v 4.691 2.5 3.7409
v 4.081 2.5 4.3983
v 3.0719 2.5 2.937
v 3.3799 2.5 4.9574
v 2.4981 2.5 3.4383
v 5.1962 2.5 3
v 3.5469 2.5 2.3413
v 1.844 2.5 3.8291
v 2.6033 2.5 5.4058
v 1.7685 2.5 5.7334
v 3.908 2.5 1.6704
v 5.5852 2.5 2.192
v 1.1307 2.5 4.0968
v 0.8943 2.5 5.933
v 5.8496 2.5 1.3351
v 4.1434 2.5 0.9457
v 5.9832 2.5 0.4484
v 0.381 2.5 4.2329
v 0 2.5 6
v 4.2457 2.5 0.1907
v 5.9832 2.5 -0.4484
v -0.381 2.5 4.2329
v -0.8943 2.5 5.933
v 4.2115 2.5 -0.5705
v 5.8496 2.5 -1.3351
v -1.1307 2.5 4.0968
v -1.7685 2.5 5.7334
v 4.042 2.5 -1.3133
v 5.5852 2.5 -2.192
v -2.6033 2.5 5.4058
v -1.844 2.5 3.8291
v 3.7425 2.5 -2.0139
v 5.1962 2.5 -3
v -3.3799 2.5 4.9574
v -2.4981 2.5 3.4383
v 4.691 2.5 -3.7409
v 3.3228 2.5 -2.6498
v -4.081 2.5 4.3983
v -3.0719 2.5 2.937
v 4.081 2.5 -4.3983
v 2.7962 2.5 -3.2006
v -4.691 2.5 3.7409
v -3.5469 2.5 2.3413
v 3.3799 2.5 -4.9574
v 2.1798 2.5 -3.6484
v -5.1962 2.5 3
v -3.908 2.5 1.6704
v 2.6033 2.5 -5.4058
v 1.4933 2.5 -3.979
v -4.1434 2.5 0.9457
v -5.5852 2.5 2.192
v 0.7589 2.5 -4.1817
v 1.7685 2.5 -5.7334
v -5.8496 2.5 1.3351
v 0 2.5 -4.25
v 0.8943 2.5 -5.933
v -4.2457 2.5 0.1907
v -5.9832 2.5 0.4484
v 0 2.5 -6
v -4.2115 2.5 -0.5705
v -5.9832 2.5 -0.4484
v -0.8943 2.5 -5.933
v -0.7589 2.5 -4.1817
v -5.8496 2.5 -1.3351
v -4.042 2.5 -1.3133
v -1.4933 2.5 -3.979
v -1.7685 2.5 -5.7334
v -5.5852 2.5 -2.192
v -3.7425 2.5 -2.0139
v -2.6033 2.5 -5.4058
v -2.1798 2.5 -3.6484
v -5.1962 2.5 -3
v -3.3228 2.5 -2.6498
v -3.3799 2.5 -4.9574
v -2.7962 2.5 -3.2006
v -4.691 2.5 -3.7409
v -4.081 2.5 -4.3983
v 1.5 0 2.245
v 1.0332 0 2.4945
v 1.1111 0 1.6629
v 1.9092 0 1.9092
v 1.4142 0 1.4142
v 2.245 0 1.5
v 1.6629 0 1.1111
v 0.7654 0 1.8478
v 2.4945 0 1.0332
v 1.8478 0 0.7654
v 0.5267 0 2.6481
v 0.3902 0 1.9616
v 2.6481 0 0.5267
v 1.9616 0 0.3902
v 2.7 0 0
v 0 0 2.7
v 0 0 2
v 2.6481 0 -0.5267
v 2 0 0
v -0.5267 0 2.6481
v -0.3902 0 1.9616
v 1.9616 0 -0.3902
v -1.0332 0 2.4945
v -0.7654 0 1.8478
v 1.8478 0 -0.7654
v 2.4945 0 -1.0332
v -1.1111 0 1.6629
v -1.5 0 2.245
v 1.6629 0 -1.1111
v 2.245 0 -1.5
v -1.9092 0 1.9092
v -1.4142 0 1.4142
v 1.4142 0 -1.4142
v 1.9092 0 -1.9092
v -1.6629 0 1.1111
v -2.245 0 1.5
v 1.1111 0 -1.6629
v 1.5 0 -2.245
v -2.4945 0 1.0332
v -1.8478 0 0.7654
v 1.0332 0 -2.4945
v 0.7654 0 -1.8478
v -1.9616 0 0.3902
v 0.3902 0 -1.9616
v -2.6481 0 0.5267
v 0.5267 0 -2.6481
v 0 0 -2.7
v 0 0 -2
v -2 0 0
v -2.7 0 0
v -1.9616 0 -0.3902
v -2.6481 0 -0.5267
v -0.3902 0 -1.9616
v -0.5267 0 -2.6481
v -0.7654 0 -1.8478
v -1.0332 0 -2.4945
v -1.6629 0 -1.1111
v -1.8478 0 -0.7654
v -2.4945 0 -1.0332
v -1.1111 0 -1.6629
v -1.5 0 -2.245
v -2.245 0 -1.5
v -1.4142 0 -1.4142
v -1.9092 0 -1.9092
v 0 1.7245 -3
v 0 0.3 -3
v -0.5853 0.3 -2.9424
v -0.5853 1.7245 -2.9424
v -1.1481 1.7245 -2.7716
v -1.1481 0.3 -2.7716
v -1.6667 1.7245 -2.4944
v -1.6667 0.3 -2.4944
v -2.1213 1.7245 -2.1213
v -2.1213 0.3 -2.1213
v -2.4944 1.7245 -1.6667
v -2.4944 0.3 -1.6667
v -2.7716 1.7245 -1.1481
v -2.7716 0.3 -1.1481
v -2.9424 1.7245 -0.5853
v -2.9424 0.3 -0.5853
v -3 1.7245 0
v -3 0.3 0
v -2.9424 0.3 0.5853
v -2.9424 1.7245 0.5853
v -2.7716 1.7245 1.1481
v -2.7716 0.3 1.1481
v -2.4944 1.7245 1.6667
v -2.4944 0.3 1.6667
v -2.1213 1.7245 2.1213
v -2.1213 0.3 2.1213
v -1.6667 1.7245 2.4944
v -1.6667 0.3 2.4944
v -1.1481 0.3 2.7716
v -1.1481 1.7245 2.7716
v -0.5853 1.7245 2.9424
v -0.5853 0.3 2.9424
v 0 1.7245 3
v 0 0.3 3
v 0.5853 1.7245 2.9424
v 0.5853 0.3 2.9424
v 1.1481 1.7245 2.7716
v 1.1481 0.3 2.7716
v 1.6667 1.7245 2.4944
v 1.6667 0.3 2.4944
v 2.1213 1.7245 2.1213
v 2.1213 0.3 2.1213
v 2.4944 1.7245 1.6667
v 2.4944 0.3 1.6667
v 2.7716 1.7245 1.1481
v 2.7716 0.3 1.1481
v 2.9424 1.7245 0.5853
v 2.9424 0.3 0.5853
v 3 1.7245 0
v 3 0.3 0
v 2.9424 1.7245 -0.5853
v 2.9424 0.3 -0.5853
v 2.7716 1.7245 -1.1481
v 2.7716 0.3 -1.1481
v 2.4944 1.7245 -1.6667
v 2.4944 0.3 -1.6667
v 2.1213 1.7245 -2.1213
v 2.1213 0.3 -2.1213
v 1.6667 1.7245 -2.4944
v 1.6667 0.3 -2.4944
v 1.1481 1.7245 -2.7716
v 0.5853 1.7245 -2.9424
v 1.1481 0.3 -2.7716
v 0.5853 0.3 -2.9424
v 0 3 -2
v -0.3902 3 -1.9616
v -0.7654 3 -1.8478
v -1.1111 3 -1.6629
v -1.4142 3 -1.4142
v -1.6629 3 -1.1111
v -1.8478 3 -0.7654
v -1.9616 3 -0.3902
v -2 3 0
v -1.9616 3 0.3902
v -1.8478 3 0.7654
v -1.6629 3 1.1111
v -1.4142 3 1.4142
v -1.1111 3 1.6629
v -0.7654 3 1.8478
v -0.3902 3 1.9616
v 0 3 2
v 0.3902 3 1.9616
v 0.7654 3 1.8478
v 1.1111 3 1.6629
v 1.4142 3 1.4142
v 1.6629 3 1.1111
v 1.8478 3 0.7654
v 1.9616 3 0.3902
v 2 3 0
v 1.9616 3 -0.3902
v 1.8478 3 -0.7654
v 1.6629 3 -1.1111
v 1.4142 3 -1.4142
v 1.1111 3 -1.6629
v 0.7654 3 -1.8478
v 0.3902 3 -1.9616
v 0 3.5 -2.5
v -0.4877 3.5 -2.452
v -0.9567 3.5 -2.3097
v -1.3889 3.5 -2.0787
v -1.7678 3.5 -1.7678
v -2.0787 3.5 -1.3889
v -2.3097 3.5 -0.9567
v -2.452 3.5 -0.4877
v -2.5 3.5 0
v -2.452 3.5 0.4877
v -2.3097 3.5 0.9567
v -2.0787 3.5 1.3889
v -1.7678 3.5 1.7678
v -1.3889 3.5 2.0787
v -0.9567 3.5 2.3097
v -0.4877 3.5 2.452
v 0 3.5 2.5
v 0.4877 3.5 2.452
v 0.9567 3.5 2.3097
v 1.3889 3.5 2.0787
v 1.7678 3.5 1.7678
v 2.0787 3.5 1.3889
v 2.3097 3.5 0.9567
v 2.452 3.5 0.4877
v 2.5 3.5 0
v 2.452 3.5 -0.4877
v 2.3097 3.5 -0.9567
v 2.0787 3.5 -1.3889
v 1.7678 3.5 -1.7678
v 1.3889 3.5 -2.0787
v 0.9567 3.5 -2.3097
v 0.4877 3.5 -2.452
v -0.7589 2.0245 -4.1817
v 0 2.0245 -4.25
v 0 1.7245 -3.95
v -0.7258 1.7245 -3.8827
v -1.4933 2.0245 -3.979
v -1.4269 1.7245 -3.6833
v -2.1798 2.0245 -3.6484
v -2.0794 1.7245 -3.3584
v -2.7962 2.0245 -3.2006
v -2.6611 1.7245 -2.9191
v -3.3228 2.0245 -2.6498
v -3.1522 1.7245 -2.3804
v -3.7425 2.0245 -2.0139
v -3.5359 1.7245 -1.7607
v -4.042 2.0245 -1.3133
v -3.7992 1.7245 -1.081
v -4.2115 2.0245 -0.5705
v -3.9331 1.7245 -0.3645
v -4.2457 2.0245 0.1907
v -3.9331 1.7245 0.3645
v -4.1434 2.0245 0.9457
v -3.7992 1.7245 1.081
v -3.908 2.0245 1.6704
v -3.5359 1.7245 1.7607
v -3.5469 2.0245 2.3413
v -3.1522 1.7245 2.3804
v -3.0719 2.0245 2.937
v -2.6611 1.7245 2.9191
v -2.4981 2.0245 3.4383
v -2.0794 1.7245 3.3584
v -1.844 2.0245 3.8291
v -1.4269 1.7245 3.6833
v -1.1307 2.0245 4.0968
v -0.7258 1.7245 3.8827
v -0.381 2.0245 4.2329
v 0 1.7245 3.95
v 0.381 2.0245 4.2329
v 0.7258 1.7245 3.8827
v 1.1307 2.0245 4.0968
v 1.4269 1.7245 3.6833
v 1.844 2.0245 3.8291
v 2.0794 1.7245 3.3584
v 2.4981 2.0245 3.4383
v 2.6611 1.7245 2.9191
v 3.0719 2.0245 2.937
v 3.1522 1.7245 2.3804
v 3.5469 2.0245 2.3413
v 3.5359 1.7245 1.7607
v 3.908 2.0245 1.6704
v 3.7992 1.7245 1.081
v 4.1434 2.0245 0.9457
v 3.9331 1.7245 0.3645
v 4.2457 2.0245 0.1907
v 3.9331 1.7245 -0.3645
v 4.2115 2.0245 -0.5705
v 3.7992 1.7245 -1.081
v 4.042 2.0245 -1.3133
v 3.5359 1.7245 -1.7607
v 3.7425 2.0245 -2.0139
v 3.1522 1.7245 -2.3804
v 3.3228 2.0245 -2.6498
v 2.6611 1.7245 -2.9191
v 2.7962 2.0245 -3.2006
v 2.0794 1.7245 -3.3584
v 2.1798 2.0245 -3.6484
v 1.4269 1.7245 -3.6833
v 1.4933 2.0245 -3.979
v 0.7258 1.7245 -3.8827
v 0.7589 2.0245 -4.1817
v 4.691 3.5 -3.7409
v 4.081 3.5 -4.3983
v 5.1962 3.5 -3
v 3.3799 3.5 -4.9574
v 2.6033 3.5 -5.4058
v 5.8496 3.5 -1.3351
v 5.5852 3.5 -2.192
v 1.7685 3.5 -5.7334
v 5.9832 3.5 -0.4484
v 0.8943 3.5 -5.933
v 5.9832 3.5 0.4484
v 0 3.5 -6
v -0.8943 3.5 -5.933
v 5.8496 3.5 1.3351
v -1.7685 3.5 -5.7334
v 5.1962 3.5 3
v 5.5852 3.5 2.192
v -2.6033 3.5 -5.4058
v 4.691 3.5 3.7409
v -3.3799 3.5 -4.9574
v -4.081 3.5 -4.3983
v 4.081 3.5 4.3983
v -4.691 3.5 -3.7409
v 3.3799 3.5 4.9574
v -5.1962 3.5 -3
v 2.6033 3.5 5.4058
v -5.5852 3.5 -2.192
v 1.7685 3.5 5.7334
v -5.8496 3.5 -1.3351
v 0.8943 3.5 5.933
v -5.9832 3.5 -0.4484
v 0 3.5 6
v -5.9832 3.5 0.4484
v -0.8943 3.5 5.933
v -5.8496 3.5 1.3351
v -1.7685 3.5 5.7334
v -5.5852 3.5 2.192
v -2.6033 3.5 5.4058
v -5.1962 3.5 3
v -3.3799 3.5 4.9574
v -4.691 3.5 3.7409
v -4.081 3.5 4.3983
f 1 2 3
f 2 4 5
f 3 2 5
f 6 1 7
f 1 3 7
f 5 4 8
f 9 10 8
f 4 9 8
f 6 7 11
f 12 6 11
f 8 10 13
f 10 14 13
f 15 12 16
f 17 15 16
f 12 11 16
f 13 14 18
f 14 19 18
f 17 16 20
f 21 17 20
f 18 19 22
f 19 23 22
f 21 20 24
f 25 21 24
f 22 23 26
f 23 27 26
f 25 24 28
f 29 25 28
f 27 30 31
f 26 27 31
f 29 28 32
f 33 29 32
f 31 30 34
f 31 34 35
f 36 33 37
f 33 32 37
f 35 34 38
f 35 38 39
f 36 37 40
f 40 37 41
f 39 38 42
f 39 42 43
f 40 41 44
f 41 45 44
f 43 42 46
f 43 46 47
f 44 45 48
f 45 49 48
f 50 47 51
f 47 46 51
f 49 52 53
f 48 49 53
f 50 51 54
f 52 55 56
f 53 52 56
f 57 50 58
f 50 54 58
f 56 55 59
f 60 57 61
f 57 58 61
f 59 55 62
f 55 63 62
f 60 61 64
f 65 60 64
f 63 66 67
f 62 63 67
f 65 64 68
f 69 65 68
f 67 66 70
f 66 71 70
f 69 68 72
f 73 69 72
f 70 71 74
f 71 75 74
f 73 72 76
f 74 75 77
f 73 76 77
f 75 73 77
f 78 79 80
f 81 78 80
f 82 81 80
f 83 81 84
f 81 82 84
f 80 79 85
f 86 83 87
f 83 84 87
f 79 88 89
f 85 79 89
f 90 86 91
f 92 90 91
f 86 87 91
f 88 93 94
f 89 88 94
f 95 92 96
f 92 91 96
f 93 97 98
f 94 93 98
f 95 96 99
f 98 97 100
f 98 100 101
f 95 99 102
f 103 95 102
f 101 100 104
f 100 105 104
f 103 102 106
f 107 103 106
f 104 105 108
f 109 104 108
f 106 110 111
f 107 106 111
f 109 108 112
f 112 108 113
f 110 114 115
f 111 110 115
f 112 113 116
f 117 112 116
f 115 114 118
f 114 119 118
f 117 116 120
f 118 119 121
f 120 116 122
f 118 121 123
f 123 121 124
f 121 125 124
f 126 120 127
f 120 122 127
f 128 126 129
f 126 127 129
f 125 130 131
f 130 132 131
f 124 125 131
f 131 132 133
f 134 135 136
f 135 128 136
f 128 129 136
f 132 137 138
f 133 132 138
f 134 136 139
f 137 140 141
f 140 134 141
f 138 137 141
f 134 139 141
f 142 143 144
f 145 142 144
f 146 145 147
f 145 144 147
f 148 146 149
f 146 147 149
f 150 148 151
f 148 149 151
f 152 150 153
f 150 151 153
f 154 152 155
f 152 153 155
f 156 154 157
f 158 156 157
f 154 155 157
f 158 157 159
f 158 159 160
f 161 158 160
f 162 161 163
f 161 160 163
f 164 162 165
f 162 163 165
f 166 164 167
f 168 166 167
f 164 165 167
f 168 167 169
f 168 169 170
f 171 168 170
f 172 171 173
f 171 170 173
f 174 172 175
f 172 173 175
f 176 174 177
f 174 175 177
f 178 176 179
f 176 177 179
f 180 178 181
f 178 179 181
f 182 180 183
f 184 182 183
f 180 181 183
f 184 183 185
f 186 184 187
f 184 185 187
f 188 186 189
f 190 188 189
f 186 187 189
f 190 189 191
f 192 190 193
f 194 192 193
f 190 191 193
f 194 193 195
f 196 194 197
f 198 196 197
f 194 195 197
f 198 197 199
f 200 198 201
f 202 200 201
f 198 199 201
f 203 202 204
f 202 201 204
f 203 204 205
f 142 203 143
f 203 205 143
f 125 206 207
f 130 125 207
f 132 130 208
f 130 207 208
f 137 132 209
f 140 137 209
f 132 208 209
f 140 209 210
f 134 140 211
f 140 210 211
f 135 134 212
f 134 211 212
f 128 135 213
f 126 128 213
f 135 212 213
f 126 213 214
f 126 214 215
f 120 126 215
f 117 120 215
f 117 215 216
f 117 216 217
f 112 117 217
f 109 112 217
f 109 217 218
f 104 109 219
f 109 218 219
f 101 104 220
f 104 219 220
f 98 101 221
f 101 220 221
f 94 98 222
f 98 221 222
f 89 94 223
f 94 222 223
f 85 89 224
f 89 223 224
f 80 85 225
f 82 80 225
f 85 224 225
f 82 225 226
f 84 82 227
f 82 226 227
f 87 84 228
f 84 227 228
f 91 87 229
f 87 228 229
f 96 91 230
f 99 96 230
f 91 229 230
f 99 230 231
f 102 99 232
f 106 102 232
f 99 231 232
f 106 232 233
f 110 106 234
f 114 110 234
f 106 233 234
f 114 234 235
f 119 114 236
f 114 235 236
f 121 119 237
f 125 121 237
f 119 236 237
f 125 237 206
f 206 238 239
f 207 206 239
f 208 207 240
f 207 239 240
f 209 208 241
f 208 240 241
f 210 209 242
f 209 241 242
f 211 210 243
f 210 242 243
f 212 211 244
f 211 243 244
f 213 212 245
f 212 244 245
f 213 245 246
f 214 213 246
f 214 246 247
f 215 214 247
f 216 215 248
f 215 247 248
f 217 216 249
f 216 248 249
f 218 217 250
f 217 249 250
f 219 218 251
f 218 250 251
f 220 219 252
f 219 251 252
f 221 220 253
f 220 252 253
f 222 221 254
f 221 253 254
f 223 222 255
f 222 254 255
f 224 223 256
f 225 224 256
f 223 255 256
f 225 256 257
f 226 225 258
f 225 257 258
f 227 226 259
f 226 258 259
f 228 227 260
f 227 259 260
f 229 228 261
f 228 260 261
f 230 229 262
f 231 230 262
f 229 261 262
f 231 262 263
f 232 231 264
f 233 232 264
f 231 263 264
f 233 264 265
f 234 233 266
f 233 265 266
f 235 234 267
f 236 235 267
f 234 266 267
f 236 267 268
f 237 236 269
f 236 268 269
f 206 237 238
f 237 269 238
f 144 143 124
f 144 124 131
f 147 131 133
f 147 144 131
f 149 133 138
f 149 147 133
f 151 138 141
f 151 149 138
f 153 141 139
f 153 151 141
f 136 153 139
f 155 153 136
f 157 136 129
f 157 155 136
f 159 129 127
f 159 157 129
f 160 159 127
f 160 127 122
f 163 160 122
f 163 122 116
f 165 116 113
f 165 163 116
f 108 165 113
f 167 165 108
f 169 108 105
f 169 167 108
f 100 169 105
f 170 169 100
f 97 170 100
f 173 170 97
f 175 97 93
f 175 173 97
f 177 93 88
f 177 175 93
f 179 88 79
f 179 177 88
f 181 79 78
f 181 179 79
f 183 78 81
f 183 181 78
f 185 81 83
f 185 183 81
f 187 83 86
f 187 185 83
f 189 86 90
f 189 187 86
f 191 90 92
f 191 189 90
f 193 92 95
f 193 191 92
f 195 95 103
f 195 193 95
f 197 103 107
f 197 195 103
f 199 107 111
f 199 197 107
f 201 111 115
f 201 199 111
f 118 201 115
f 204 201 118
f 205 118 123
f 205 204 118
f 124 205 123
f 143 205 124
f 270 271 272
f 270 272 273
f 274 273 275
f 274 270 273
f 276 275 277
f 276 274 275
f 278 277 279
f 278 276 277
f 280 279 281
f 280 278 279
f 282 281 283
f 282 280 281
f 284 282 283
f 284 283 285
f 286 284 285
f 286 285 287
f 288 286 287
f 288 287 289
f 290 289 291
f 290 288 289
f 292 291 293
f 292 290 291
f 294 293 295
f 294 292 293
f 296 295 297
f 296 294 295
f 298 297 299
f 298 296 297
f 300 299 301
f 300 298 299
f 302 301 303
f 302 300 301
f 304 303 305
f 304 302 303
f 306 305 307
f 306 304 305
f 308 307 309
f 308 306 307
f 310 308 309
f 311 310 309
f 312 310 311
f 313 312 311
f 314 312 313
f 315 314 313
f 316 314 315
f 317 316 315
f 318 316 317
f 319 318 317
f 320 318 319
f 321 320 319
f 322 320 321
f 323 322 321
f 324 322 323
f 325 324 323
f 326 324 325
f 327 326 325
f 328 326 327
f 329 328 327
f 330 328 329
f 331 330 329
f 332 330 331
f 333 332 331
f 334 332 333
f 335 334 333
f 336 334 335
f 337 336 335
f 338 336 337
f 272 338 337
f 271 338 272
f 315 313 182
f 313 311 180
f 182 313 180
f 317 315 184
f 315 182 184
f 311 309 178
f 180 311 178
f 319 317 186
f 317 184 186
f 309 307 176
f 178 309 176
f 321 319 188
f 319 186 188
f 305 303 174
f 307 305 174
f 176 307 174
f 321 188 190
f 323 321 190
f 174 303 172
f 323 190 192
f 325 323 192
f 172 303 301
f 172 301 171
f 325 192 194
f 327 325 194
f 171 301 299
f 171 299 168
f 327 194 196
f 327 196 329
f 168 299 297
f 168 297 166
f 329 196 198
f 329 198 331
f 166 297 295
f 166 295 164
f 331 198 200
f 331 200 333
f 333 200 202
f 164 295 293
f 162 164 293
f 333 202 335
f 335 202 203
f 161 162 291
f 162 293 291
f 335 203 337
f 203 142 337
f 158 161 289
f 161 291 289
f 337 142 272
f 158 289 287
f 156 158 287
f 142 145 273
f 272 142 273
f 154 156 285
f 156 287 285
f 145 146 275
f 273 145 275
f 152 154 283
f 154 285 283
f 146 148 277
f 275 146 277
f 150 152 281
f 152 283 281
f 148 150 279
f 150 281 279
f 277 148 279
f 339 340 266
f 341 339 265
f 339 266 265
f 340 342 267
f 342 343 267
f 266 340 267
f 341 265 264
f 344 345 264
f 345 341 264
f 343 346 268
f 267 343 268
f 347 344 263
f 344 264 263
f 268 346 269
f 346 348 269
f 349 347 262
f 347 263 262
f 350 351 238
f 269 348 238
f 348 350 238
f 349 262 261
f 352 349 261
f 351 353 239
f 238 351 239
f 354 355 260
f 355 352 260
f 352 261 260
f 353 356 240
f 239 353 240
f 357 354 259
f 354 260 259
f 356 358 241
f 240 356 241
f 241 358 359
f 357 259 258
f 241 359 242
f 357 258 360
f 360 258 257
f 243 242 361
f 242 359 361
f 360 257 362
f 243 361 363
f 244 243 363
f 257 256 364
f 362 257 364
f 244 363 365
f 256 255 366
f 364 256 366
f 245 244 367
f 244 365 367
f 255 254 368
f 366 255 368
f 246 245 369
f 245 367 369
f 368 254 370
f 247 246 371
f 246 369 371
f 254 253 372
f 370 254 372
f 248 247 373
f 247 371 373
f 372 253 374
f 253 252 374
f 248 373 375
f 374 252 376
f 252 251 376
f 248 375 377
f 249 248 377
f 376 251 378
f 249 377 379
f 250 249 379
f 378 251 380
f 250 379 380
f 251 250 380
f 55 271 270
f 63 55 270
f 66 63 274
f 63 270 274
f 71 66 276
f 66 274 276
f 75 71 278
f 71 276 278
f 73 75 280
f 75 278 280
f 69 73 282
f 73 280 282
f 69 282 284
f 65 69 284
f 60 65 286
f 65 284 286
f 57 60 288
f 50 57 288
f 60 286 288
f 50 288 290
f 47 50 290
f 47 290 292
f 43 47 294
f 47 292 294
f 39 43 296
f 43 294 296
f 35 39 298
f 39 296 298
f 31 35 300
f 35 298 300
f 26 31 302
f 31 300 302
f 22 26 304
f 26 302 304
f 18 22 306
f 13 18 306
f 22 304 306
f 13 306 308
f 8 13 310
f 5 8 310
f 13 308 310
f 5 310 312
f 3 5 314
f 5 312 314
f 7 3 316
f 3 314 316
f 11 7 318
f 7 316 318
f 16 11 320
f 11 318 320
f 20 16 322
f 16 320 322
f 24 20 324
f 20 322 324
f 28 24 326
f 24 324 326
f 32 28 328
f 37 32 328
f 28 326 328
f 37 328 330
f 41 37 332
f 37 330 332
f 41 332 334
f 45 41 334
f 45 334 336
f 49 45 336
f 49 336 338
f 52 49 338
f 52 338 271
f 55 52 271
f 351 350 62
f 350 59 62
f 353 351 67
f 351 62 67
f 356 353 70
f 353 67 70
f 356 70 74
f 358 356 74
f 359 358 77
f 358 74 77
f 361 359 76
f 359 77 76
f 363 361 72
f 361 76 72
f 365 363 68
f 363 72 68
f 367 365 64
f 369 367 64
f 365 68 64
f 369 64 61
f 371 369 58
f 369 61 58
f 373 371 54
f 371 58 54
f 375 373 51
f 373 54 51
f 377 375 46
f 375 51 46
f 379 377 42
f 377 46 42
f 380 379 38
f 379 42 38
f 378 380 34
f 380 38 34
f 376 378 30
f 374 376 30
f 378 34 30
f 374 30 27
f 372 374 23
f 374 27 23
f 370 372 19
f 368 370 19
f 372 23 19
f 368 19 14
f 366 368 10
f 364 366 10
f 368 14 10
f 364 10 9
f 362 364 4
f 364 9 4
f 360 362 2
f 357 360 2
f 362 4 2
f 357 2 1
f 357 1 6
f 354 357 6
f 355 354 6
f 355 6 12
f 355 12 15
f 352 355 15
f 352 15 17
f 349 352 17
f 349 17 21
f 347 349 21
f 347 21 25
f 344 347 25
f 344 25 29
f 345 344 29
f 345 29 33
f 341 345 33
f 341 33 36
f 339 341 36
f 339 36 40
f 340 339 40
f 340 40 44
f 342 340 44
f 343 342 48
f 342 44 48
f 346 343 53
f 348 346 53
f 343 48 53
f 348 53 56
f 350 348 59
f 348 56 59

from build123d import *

# Parameters (mm, degrees)
CHANFREIN1_SIZE = 0.5
CHANFREIN2_SIZE = 0.3


with BuildPart() as part:
    # Esquisse1 → Révolution1 (revolve)
    with BuildSketch(Plane.XY, mode=Mode.PRIVATE) as r_volution1_sk:
        Polygon((2, 0), (2, 3.5), (6, 3.5), (6, 2.5), (4.25, 2.5), (4.25, 1.724524585), (3, 1.724524585), (3, 0), align=None)
    revolve(r_volution1_sk.sketch.rotate(Axis((0, 0, 0), (0, 1, 0)), 90), axis=Axis((0, 0, 0), (0, 1, 0)))

    # Chanfrein1
    chanfrein1_edges = [part.edges().sort_by_distance(p)[0] for p in [
        (0, 3.5, 2),
    ]]
    chamfer(chanfrein1_edges, length=CHANFREIN1_SIZE)

    # Chanfrein2
    chanfrein2_edges = [part.edges().sort_by_distance(p)[0] for p in [
        (0, 0, 3),
        (0, 1.724524585, 4.25),
    ]]
    chamfer(chanfrein2_edges, length=CHANFREIN2_SIZE)


solid = part.part
